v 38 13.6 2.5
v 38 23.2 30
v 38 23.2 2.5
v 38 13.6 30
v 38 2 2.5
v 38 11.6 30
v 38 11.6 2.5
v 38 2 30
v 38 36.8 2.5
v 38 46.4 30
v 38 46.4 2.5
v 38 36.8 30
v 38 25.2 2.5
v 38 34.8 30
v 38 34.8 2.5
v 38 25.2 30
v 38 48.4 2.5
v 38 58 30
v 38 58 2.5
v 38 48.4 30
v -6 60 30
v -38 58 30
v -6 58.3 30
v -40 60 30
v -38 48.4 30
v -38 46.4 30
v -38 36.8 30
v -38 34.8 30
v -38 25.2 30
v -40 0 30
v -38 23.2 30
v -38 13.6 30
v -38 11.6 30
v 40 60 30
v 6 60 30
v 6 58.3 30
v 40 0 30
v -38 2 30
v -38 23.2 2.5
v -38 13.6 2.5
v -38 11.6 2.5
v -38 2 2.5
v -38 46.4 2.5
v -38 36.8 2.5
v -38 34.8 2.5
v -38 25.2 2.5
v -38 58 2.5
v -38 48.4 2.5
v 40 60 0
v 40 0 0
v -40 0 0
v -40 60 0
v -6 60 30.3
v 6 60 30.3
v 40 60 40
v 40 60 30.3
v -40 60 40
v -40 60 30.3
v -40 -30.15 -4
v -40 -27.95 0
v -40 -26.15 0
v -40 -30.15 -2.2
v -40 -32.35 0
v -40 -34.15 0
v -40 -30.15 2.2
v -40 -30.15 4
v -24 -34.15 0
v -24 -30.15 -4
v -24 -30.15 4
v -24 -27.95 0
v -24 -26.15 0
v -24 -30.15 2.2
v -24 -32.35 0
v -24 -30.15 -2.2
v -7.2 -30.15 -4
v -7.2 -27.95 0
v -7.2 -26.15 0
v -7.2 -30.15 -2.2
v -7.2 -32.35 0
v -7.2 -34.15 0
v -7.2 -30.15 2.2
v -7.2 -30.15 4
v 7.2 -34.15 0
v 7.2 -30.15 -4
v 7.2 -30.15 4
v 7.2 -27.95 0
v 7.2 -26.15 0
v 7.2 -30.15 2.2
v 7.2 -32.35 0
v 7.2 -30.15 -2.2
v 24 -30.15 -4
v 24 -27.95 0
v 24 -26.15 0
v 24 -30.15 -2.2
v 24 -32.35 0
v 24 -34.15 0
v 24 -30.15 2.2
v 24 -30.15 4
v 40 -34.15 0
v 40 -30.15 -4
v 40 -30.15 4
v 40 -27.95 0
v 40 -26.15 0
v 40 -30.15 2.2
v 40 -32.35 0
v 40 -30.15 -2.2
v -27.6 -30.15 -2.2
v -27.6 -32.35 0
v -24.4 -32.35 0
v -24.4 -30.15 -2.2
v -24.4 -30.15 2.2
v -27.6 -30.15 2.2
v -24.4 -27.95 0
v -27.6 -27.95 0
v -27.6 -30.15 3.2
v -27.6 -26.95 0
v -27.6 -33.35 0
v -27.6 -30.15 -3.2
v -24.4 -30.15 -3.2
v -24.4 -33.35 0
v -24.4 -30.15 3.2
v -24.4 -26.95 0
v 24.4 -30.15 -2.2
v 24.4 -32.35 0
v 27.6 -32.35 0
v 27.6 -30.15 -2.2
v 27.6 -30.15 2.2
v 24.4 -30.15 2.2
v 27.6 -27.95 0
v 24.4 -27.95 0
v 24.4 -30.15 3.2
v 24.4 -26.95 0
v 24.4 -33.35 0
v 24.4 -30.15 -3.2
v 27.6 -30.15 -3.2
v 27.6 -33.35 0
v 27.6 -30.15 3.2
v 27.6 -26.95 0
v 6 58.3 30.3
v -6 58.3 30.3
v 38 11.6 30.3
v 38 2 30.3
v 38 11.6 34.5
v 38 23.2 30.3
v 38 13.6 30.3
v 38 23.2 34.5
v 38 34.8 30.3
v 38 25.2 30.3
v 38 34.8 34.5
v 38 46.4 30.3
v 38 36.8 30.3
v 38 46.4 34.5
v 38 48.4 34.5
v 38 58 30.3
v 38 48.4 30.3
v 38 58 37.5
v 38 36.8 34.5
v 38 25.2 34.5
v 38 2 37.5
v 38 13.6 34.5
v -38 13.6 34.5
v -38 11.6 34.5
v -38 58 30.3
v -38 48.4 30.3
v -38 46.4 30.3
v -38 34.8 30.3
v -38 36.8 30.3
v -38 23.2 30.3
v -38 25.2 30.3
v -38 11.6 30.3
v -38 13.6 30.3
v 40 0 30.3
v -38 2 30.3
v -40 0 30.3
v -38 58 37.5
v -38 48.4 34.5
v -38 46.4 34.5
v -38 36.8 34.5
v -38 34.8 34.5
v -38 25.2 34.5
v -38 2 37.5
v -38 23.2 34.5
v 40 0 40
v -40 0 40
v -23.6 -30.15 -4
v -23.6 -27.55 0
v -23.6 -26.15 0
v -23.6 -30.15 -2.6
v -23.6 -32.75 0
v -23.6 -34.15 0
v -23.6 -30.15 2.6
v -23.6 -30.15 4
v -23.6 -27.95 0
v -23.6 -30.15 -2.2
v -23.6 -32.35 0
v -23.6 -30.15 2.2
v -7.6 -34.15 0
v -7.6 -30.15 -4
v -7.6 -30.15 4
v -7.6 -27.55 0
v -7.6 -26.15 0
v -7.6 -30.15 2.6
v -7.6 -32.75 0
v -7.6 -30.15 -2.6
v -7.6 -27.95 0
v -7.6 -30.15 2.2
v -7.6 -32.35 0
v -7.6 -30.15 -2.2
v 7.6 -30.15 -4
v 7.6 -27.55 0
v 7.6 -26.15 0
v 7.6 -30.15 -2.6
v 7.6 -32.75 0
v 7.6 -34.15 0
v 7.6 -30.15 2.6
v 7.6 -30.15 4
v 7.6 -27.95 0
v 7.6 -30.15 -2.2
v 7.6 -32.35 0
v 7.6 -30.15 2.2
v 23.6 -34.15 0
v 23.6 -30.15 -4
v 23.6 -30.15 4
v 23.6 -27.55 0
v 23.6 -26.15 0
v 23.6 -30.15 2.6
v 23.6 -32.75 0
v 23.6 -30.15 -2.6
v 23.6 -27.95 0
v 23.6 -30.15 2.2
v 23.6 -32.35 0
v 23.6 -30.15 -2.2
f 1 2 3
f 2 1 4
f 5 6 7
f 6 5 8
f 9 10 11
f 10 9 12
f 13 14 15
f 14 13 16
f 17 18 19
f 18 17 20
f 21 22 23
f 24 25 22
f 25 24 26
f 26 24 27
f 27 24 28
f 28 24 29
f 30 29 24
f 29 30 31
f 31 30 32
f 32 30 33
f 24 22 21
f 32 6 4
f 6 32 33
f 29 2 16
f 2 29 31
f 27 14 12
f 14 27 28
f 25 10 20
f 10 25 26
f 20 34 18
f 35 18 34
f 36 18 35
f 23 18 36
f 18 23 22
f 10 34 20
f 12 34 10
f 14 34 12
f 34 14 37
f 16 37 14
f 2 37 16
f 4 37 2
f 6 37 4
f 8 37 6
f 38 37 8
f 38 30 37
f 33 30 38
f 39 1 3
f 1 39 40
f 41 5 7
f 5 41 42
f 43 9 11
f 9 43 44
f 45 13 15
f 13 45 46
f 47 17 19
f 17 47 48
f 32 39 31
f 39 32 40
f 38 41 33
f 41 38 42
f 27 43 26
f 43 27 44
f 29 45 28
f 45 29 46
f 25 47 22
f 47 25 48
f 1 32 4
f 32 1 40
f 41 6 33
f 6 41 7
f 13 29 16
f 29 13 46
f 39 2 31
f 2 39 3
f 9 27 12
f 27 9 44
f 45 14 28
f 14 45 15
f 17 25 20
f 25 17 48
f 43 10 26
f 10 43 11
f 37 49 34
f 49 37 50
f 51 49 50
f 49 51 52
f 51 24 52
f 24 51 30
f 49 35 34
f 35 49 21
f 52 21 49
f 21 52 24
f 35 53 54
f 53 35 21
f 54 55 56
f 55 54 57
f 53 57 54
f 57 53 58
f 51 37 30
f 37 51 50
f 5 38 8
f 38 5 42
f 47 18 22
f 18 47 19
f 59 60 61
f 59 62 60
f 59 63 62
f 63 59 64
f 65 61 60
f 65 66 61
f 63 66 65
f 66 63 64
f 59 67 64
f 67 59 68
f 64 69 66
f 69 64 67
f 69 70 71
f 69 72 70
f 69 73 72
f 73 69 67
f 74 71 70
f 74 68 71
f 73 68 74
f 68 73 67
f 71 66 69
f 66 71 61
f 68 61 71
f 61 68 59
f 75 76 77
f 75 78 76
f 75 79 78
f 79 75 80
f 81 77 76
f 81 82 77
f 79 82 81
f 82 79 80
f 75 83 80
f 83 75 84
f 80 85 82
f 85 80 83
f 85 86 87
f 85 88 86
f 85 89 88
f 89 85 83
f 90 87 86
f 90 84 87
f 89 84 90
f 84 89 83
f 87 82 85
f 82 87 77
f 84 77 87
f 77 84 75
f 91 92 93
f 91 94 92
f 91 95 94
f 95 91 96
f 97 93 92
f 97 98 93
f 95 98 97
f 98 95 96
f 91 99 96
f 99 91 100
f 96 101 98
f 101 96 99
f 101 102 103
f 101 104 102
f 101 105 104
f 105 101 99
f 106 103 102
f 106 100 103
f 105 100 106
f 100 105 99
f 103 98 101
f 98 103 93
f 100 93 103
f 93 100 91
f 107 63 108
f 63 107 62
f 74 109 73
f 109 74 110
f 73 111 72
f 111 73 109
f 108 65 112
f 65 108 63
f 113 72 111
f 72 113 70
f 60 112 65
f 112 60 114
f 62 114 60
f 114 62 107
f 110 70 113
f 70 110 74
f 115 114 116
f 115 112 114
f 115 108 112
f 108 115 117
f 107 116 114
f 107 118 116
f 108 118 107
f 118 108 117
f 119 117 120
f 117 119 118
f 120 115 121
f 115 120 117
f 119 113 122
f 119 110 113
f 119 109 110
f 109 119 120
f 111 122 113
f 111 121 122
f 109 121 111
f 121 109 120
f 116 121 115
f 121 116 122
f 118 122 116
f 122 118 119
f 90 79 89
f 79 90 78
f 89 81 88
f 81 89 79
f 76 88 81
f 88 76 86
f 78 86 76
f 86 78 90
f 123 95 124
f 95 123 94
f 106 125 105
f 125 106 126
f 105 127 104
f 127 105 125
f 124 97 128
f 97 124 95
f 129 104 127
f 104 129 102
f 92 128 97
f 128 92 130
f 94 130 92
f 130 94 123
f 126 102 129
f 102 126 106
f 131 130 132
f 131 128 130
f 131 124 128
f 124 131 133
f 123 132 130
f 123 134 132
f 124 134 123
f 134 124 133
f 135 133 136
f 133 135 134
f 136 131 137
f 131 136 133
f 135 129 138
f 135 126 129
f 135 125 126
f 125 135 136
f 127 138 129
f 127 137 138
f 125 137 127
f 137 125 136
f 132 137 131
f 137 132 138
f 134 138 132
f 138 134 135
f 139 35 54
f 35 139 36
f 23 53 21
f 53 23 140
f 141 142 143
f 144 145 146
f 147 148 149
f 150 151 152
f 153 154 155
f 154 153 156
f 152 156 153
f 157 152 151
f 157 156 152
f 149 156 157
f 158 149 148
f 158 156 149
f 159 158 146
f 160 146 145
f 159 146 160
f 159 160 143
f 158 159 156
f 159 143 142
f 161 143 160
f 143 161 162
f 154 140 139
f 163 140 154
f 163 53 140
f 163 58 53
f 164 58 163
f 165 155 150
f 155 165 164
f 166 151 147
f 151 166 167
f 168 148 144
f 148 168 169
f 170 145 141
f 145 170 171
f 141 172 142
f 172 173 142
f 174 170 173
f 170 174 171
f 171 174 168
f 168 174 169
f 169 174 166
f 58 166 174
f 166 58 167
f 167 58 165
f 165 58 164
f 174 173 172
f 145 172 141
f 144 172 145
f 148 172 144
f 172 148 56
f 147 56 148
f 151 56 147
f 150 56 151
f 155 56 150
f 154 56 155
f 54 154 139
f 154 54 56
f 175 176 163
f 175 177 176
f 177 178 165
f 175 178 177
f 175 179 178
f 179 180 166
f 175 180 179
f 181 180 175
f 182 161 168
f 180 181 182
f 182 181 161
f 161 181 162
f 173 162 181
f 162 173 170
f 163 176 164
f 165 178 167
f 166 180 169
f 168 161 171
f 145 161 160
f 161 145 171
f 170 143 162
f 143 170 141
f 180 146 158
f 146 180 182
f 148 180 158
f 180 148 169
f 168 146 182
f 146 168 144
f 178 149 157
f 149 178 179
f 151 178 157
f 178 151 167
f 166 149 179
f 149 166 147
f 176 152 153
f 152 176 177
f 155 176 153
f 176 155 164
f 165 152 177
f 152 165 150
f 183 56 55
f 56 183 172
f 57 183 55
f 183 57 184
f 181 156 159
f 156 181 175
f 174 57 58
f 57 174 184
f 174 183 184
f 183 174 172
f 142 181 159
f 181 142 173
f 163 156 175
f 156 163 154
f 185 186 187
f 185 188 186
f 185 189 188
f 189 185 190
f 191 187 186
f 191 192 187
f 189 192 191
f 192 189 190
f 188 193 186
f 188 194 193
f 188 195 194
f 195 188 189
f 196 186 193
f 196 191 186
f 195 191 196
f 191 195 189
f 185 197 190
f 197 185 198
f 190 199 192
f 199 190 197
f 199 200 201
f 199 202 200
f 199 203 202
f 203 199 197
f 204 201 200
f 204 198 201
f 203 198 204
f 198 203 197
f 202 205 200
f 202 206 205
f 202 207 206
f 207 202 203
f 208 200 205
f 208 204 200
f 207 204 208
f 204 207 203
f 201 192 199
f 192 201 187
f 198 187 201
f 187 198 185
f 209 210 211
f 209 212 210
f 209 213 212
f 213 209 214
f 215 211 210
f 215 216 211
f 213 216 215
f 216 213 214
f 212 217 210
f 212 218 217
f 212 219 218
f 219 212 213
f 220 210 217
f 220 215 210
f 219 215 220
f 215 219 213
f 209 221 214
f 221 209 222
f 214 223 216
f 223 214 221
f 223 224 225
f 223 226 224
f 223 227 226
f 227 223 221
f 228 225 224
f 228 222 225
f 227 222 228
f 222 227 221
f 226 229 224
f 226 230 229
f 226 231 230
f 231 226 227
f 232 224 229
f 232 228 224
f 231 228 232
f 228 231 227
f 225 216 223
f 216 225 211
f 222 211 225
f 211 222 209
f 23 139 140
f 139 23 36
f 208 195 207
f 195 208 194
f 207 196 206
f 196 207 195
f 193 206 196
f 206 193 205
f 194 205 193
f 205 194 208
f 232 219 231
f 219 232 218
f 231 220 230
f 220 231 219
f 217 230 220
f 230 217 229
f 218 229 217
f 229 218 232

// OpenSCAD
/* Box with print-in-place hinge - step 1: params + base */
part = "assembly"; // [base, lid, pin, assembly]

cadverify_only = "";
module instance(name, part, unit = 1) {
    echo(cadverify_instance = [name, part, unit]);
    if (cadverify_only == "" || cadverify_only == name) children();
}

// ---- parameters (mm) ----
W = 80; D = 60; H = 40;          // body outer, closed
baseH = 30;                      // base height
gapZLid = 0.3;                   // lid-base vertical gap
lidBot = baseH + gapZLid;        // 30.3
lidTop = H;                      // 40
axY = 0; axZ = baseH + gapZLid/2; // hinge axis (0, 30.15)
wallT = 2; floorT = 2.5; lidTopT = 2.5;
pinH = 1.8; boreH = 2.2; outH = 4.0; cbH = 3.2; capH = 2.8;
clrR = 0.4; clrA = 0.4;
divT = 2; divTop = 37.2;

// knuckle X intervals
bx10=-40; bx11=-24; lx10=-23.6; lx11=-7.6;
bx20=-7.2; bx21=7.2; lx20=7.6; lx21=23.6; bx30=24; bx31=40;

// generic prism along X from polygon in (Z,Y) mapped: poly points [z,y]
module prism_x(poly, x0, len) {
    translate([x0, 0, 0]) rotate([0,90,0])
        linear_extrude(height=len) polygon(poly);
}
function diamond(h) = [[-h,0],[0,-h],[h,0],[0,h]];

module knuckle_out(x0, len) {
    // diamond cross-section points [z,y] centered at (axZ, axY)
    p = diamond(outH);
    translate([0, axY, axZ]) prism_x(p, x0, len);
}
module bore_small(x0, len) {
    p = diamond(boreH);
    translate([0, axY, axZ]) prism_x(p, x0, len);
}
module bore_cb(x0, len) {
    p = diamond(cbH);
    translate([0, axY, axZ]) prism_x(p, x0, len);
}

function D(h,y0,z0) = [[y0-h,-z0],[y0,-z0-h],[y0+h,-z0],[y0,-z0+h]];
module dia(h,y0,z0,x0,x1) {
    translate([x0,0,0]) rotate([0,90,0])
        linear_extrude(height=x1-x0, convexity=4) polygon(D(h,y0,z0));
}
module base_geo() {
    difference() {
        union() {
            translate([-40,0,0]) cube([80,60,2.5]);            // floor
            translate([-40,0,0]) cube([80,2,30]);              // back wall
            translate([-40,58,0]) cube([80,2,30]);             // front wall
            translate([-40,2,0]) cube([2,56,30]);              // left wall
            translate([38,2,0]) cube([2,56,30]);               // right wall
            for (cy=[12.6,24.2,35.8,47.4])
                translate([-38,cy-1,2.5]) cube([76,2,27.5]);   // dividers
            dia(outH,0,axZ,bx10,bx11);                         // knuckles
            dia(outH,0,axZ,bx20,bx21);
            dia(outH,0,axZ,bx30,bx31);
        }
        // bore channels + cap pockets
        dia(boreH,0,axZ,bx10,bx11); dia(cbH,0,axZ,-27.6,-24.4);
        dia(boreH,0,axZ,bx20,bx21);
        dia(boreH,0,axZ,bx30,bx31); dia(cbH,0,axZ,24.4,27.6);
        // back-wall notches under lid knuckles
        dia(boreH+clrR,0,axZ,lx10,lx11);
        dia(boreH+clrR,0,axZ,lx20,lx21);
        // catch groove in front wall outer face
        translate([-6,58.8,27.5]) cube([12,1.21,1.5]);
    }
}

module lid_geo() {
    difference() {
        union() {
            // top plate: x -40..40, y 0..60, z 37.5..40
            translate([-40,0,37.5]) cube([80,60,2.5]);
            // lid skirt walls 2mm, y 0..60, z 30.3..37.5
            translate([-40,0,30.3]) cube([80,2,7.2]);    // back band
            translate([-40,58,30.3]) cube([80,2,7.2]);   // front band
            translate([-40,2,30.3]) cube([2,56,7.2]);    // left band
            translate([38,2,30.3]) cube([2,56,7.2]);     // right band
            // lid skirt inner closure panels (also skirt divider walls)
            for (cy=[12.6,24.2,35.8,47.4])
                translate([-38,cy-1,30.3]) cube([76,2,4.2]);  // up to 34.5
            // lid knuckles + catch tongue
            dia(outH,0,axZ,lx10,lx11);
            dia(outH,0,axZ,lx20,lx21);
            translate([-6,58.3,27.5]) cube([12,1.7,3.4]);  // tongue tab below front band
        }
        // bore channels
        dia(boreH,0,axZ,lx10,lx11);
        dia(boreH,0,axZ,lx20,lx21);
        // clearance pockets opposite base knuckles
        dia(boreH+clrR,0,axZ,-27.6,-23.6);
        dia(boreH+clrR,0,axZ,-7.6,-7.2);
        dia(boreH+clrR,0,axZ,7.2,7.6);
        dia(boreH+clrR,0,axZ,23.6,27.6);
    }
}
// stubs
module pin_geo() { cube([0.01,0.01,0.01]); }

if (part=="base") { base_geo(); }
else if (part=="lid") { lid_geo(); }
else if (part=="pin") { pin_geo(); }
else if (part=="assembly") {
    instance("base","base") base_geo();
    instance("lid","lid") lid_geo();
    instance("pin","pin") pin_geo();
}
